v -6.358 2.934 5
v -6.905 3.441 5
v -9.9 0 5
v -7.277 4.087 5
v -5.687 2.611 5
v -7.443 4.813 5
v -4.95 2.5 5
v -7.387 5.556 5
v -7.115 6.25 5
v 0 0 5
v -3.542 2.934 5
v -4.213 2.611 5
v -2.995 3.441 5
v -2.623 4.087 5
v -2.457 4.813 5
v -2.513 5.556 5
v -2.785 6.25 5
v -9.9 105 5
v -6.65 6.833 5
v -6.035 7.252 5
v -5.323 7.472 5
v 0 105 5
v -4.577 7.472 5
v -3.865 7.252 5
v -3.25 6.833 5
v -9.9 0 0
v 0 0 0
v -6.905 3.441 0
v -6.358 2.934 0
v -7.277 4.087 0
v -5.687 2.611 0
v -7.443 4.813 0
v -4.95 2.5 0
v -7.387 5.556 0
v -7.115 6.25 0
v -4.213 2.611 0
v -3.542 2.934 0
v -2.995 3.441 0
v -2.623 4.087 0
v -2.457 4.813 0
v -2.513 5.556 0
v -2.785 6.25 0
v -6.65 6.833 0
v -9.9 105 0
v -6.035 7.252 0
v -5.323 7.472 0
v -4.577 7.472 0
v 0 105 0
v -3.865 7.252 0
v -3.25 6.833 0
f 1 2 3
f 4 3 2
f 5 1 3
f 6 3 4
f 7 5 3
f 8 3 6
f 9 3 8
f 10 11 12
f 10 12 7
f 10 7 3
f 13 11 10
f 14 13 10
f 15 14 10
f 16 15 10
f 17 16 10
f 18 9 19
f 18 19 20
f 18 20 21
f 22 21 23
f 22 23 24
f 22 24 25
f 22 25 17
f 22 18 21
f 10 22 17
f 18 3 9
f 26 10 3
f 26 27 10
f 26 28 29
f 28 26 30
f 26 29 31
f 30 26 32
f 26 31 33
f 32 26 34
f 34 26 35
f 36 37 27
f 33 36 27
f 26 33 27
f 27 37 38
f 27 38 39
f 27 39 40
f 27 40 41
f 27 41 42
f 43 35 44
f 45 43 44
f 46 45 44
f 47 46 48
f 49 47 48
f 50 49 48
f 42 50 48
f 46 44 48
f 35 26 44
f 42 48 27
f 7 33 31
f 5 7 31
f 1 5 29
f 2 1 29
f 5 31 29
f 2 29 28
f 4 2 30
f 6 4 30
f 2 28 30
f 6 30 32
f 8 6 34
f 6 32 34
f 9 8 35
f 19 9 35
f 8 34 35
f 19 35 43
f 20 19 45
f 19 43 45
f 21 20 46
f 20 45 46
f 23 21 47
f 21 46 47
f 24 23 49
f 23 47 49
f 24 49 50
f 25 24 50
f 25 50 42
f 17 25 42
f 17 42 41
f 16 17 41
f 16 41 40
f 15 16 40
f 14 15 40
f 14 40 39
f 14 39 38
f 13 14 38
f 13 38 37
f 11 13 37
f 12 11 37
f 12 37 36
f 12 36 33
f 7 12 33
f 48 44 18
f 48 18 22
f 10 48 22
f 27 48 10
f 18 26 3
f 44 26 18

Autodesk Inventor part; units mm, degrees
ref_plane "YZ Plane" through (0, 0, 0) normal (1, 0, 0) x (0, 1, 0)
ref_plane "XZ Plane" through (0, 0, 0) normal (0, 1, 0) x (-1, 0, 0)
ref_plane "XY Plane" through (0, 0, 0) normal (0, 0, 1) x (1, 0, 0)
sketch "Sketch2" plane through (0, 0, 0) normal (0, 0, 1) x (1, 0, 0)
  line L0 (0, 0) -> (-9.9, 0)
  line L1 (-9.9, 0) -> (-9.9, 105)
  line L2 (-9.9, 105) -> (0, 105)
  line L3 (0, 105) -> (0, 0)
  point P0 (-5, 18)
  dimension "d4" = 9.9
  dimension "d5" = 105
extrude "Extrusion2" add sketch "Sketch2" along normal blind 5
sketch "Sketch3" plane through (0, 0, 5) normal (0, 0, 1) x (1, 0, 0)
  point P0 (0, 0)
  point P1 (-4.95, 5)
hole "Hole3" at (-4.95, 5, 5) direction (0, 0, -1) diameter 5 depth 6
properties part number "Elbow_Cube_Holder_TestFit_V2"
